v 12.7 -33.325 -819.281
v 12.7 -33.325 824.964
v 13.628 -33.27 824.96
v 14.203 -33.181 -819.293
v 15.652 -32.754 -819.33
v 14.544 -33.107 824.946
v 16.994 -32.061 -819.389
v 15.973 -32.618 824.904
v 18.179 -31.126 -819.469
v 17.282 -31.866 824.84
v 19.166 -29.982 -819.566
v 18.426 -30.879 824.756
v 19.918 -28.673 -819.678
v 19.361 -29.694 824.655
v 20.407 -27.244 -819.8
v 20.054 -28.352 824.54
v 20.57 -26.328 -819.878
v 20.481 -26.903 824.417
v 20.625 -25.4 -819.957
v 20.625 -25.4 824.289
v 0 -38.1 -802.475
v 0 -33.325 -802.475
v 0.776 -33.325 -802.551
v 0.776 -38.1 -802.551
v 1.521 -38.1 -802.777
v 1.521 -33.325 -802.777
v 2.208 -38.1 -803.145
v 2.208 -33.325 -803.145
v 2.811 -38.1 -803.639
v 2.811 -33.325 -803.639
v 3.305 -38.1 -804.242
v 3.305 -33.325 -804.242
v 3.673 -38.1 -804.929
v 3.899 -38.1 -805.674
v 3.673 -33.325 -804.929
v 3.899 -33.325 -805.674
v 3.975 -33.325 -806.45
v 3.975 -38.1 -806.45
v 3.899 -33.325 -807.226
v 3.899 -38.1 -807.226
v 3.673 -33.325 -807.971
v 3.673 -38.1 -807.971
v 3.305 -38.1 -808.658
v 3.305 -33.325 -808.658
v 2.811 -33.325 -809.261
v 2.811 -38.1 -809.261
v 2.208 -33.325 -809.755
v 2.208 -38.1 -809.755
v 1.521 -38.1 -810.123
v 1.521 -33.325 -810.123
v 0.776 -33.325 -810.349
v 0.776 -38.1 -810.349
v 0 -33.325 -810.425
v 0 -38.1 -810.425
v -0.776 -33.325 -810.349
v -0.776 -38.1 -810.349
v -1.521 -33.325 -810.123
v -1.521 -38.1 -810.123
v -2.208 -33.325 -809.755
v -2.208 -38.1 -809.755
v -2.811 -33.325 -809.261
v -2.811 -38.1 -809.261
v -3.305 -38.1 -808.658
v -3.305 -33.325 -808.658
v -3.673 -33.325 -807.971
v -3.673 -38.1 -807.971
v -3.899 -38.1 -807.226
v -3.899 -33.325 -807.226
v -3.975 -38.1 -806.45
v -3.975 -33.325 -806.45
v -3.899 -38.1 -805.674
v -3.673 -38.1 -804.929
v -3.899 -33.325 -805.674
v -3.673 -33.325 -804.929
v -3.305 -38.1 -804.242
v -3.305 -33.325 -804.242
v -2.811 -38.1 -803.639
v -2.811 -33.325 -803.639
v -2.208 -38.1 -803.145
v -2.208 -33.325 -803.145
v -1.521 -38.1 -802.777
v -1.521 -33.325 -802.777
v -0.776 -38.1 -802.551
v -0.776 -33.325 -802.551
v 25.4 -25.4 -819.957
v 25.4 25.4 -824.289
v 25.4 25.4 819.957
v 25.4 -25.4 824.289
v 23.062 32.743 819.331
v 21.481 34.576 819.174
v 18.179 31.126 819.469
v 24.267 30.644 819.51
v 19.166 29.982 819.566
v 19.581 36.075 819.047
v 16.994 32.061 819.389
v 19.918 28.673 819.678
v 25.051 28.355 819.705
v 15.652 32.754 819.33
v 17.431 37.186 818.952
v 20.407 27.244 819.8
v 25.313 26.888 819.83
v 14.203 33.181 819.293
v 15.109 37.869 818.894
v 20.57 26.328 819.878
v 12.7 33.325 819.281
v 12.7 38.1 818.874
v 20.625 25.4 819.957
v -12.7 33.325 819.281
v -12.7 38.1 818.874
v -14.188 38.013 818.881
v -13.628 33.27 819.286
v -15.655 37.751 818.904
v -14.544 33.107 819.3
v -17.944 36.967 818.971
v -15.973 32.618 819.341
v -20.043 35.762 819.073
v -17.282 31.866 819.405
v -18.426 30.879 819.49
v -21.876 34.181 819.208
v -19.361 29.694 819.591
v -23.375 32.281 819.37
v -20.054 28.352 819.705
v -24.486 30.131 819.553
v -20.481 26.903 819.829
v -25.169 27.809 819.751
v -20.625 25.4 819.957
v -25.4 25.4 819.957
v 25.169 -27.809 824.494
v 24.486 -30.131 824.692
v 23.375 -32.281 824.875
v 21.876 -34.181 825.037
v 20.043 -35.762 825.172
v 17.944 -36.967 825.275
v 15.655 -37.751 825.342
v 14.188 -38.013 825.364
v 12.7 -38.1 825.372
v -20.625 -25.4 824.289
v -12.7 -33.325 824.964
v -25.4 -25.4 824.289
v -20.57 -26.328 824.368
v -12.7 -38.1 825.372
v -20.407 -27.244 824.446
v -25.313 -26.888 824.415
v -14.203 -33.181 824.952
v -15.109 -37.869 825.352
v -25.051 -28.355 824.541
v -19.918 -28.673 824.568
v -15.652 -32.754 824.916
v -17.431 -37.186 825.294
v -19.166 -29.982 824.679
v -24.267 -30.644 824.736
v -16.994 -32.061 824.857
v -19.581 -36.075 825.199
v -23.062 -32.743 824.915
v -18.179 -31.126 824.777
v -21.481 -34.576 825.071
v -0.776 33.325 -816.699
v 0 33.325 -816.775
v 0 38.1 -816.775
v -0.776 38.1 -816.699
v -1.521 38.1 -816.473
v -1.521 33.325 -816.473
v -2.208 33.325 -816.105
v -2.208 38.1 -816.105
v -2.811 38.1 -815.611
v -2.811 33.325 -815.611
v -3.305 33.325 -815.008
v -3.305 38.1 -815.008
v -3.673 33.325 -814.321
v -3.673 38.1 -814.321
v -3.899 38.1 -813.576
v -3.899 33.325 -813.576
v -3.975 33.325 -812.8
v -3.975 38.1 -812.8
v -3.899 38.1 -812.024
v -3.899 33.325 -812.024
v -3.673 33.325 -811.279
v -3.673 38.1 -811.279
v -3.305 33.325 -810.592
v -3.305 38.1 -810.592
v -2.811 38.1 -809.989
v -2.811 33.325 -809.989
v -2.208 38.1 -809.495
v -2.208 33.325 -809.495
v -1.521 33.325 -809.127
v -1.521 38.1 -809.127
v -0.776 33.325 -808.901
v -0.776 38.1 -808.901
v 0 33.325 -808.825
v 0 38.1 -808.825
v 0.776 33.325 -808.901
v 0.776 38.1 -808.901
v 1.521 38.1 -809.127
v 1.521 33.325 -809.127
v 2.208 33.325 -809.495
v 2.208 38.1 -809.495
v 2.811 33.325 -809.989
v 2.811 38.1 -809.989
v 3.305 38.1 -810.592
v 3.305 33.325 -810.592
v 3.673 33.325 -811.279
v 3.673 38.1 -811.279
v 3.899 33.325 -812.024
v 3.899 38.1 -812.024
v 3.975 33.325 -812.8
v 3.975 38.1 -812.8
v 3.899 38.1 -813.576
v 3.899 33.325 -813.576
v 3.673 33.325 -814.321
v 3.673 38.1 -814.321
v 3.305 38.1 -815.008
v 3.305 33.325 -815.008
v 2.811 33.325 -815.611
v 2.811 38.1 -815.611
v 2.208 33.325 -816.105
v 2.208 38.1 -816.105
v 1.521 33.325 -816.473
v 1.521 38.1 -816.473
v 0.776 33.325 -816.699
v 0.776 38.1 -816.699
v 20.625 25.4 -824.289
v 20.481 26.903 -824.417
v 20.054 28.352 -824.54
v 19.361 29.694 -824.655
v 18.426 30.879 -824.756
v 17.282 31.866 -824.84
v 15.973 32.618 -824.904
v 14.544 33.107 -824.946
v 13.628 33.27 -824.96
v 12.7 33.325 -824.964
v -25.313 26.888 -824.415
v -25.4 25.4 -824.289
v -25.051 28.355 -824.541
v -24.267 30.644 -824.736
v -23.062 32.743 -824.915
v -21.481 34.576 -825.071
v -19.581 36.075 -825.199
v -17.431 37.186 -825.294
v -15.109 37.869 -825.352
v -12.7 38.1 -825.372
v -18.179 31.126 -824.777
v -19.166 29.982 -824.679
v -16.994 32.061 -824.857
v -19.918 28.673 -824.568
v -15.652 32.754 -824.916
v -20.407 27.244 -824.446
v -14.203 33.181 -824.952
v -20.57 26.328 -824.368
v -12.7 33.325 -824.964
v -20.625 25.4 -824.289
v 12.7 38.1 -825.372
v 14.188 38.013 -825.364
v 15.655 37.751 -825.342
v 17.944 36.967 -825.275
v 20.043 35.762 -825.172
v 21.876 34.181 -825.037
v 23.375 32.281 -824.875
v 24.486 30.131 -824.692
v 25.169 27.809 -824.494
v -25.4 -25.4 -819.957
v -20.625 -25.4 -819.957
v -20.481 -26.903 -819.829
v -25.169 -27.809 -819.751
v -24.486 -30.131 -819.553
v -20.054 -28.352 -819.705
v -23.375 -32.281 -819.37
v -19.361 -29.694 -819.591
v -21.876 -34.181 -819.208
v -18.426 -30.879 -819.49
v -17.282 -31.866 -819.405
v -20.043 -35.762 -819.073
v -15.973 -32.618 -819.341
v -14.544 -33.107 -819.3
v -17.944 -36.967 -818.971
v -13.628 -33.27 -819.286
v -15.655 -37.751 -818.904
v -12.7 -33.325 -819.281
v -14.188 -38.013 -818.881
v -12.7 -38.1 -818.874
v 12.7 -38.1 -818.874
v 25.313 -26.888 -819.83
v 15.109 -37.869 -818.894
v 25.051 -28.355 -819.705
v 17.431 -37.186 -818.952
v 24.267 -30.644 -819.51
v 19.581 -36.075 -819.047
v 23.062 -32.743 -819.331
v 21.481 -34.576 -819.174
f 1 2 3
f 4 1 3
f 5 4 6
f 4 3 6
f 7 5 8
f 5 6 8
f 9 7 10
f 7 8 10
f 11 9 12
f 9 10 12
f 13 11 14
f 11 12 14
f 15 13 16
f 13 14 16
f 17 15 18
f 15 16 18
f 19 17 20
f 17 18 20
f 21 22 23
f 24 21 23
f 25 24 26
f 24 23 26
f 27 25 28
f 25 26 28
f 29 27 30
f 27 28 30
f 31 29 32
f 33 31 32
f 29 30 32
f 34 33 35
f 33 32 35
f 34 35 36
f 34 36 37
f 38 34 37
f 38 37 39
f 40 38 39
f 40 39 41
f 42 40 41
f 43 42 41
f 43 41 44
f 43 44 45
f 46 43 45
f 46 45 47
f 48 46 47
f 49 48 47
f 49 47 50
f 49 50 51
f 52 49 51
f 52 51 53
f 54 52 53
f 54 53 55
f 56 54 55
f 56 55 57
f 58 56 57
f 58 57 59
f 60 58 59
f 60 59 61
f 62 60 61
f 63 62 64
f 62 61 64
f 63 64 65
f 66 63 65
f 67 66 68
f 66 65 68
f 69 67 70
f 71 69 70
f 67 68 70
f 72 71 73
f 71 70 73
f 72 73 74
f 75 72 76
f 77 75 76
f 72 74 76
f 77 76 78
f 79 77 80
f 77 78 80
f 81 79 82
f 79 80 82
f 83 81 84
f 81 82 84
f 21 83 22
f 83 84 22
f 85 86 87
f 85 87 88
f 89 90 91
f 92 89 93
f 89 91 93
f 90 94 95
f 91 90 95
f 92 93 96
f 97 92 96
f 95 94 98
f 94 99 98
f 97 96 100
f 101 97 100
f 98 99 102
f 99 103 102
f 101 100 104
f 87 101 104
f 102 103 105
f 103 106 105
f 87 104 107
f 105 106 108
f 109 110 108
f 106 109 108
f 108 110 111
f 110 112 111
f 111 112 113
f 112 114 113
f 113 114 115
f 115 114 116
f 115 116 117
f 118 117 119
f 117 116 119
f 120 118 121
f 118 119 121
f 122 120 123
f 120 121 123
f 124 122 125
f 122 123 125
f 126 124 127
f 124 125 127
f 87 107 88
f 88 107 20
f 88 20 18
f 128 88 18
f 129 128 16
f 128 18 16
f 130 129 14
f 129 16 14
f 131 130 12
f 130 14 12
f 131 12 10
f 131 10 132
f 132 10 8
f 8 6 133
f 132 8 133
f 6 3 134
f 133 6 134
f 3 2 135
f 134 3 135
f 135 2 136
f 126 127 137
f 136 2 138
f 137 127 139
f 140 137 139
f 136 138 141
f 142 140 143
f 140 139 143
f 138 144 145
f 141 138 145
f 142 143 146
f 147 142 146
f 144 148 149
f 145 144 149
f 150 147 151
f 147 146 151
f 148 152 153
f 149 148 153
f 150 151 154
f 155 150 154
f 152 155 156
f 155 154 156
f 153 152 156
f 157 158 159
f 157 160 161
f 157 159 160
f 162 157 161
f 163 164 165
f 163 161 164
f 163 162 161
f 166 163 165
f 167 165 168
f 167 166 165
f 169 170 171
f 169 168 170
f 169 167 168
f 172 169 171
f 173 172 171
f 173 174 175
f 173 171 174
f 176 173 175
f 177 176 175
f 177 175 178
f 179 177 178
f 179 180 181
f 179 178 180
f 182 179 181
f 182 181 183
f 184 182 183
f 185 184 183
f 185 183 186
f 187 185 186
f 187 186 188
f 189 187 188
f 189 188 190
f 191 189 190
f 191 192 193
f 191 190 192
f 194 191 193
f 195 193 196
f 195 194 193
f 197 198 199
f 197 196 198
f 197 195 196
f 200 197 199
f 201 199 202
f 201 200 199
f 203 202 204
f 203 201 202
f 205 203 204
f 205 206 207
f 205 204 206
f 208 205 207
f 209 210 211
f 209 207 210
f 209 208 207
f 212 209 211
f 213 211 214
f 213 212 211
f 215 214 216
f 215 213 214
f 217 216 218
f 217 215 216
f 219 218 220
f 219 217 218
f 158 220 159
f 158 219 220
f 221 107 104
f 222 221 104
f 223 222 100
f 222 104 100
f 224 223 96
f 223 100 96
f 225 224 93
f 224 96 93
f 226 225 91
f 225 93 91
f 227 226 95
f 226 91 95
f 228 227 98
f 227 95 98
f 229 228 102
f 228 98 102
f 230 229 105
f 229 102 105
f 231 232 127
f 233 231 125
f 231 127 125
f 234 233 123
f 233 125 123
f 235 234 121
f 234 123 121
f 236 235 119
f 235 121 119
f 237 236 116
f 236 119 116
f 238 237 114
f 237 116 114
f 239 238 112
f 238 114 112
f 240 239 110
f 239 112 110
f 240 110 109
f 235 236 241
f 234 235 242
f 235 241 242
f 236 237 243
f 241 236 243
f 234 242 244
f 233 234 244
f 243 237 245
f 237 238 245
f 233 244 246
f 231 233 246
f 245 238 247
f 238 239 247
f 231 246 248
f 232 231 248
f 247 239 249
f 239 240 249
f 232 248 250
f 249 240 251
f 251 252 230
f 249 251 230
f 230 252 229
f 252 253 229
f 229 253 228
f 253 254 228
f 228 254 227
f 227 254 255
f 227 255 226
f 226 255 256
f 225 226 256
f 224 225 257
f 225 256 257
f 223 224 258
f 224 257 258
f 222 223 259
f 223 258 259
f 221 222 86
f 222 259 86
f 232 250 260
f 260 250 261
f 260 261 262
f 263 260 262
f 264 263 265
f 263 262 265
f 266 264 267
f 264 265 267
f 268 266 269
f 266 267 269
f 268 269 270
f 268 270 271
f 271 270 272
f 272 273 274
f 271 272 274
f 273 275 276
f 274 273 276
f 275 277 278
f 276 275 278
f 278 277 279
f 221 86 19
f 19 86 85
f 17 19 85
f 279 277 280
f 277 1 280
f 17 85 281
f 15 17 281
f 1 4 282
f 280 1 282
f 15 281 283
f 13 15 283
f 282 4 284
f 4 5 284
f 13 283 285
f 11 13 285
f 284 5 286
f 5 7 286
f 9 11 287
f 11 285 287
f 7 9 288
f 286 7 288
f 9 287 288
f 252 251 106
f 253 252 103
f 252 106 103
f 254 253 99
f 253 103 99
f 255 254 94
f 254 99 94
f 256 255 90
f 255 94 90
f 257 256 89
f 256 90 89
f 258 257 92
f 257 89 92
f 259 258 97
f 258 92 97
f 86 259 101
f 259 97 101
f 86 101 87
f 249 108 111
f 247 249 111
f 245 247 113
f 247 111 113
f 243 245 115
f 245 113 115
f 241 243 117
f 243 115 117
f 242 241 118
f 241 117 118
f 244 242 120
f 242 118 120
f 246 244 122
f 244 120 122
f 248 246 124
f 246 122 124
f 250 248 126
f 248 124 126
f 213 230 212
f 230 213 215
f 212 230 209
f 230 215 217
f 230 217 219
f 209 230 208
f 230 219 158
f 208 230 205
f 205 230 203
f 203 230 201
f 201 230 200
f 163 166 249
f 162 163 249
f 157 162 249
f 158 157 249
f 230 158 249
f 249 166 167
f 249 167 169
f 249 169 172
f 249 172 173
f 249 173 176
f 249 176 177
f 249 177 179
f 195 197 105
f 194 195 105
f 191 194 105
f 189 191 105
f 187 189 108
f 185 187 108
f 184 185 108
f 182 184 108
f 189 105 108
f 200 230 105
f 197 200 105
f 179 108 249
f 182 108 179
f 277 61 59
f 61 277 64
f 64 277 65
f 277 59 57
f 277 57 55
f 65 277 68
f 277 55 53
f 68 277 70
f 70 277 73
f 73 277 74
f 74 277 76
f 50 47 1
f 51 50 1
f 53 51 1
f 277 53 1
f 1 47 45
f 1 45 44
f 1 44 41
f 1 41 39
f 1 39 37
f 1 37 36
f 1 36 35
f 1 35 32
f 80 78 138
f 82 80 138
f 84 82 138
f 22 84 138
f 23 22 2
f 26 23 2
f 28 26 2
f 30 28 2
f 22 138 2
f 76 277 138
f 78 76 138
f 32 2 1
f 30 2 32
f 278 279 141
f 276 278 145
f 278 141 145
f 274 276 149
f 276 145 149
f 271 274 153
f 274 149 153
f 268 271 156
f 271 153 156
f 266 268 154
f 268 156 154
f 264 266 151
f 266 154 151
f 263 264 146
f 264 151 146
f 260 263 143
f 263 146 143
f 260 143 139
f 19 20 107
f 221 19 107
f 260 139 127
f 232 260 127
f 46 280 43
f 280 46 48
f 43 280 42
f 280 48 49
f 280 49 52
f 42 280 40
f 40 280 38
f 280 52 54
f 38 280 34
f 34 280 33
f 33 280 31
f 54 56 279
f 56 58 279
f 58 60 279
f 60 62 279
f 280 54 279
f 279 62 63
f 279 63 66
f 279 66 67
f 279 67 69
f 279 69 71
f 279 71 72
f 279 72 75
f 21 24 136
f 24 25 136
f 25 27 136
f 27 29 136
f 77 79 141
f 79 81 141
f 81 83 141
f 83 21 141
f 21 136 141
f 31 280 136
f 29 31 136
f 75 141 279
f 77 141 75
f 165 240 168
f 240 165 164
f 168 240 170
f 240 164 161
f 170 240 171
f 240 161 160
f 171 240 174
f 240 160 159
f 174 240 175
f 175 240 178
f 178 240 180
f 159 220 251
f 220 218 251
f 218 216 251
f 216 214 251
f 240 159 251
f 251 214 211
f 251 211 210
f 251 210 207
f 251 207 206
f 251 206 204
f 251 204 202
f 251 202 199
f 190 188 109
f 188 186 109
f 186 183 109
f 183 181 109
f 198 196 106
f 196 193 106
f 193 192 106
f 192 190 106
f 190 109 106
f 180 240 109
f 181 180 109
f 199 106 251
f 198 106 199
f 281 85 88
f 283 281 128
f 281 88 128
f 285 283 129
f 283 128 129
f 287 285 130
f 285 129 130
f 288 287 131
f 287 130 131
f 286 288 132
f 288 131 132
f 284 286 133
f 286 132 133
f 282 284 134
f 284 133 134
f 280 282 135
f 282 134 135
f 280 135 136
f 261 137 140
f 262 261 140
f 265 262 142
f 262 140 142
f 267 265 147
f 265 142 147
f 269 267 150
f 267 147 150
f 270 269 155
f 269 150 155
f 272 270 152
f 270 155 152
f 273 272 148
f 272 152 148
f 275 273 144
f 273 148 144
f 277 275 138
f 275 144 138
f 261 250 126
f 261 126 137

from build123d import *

# Parameters (mm, degrees)
BASE_EXTRUDE_DEPTH = 838.2
CUT_EXTRUDE1_DEPTH = 38.1
SKETCH5_R          = 3.9751
CUT_EXTRUDE3_DEPTH = 827.640765765
SKETCH6_R          = 3.9751
CUT_EXTRUDE4_DEPTH = 827.640765765


with BuildPart() as part:
    # Sketch1 → Base-Extrude (new, symmetric)
    with BuildSketch(Plane.XY):
        with BuildLine():
            Line((-12.7, 38.1), (12.7, 38.1))
            ThreePointArc((12.7, 38.1), (21.680256121, 34.380256121), (25.4, 25.4))
            Line((25.4, 25.4), (25.4, -25.4))
            ThreePointArc((25.4, -25.4), (21.680256121, -34.380256121), (12.7, -38.1))
            Line((12.7, -38.1), (-12.7, -38.1))
            ThreePointArc((-12.7, -38.1), (-21.680256121, -34.380256121), (-25.4, -25.4))
            Line((-25.4, -25.4), (-25.4, 25.4))
            ThreePointArc((-25.4, 25.4), (-21.680256121, 34.380256121), (-12.7, 38.1))
        make_face()
        with BuildLine():
            Line((-20.6248, 25.4), (-20.6248, -25.4))
            ThreePointArc((-20.6248, -25.4), (-18.30367982, -31.00367982), (-12.7, -33.3248))
            Line((-12.7, -33.3248), (12.7, -33.3248))
            ThreePointArc((12.7, -33.3248), (18.30367982, -31.00367982), (20.6248, -25.4))
            Line((20.6248, -25.4), (20.6248, 25.4))
            ThreePointArc((20.6248, 25.4), (18.30367982, 31.00367982), (12.7, 33.3248))
            Line((12.7, 33.3248), (-12.7, 33.3248))
            ThreePointArc((-12.7, 33.3248), (-18.30367982, 31.00367982), (-20.6248, 25.4))
        make_face(mode=Mode.SUBTRACT)
    extrude(amount=BASE_EXTRUDE_DEPTH, both=True)

    # Sketch2 → Cut-Extrude1 (cut, symmetric)
    with BuildSketch(Plane(origin=(0, 0, 0), x_dir=(0, 0, -1), z_dir=(1, 0, 0))):
        Polygon((-811.795200446, 121.113483343), (-832.45021311, -121.113483343), (-857.85021311, -121.113483343), (-857.85021311, 121.113483343), align=None)
        Polygon((833.122276443, 128.994953344), (811.123137113, -128.994953344), (858.522276443, -128.994953344), (858.522276443, 128.994953344), align=None)
    extrude(amount=CUT_EXTRUDE1_DEPTH, both=True, mode=Mode.SUBTRACT)

    # Sketch5 → Cut-Extrude3 (cut, through all)
    with BuildSketch(Plane(origin=(0, 0, 0), x_dir=(1, 0, 0), z_dir=(0, 1, 0))):
        with Locations(Location((0, 806.45, 0), (0, 0, 270))):
            Circle(SKETCH5_R)
    extrude(amount=-CUT_EXTRUDE3_DEPTH, mode=Mode.SUBTRACT)

    # Sketch6 → Cut-Extrude4 (cut, through all)
    with BuildSketch(Plane(origin=(0, 0, 0), x_dir=(1, 0, 0), z_dir=(0, 1, 0))):
        with Locations(Location((0, 812.8, 0), (0, 0, 90))):
            Circle(SKETCH6_R)
    extrude(amount=CUT_EXTRUDE4_DEPTH, mode=Mode.SUBTRACT)


solid = part.part
